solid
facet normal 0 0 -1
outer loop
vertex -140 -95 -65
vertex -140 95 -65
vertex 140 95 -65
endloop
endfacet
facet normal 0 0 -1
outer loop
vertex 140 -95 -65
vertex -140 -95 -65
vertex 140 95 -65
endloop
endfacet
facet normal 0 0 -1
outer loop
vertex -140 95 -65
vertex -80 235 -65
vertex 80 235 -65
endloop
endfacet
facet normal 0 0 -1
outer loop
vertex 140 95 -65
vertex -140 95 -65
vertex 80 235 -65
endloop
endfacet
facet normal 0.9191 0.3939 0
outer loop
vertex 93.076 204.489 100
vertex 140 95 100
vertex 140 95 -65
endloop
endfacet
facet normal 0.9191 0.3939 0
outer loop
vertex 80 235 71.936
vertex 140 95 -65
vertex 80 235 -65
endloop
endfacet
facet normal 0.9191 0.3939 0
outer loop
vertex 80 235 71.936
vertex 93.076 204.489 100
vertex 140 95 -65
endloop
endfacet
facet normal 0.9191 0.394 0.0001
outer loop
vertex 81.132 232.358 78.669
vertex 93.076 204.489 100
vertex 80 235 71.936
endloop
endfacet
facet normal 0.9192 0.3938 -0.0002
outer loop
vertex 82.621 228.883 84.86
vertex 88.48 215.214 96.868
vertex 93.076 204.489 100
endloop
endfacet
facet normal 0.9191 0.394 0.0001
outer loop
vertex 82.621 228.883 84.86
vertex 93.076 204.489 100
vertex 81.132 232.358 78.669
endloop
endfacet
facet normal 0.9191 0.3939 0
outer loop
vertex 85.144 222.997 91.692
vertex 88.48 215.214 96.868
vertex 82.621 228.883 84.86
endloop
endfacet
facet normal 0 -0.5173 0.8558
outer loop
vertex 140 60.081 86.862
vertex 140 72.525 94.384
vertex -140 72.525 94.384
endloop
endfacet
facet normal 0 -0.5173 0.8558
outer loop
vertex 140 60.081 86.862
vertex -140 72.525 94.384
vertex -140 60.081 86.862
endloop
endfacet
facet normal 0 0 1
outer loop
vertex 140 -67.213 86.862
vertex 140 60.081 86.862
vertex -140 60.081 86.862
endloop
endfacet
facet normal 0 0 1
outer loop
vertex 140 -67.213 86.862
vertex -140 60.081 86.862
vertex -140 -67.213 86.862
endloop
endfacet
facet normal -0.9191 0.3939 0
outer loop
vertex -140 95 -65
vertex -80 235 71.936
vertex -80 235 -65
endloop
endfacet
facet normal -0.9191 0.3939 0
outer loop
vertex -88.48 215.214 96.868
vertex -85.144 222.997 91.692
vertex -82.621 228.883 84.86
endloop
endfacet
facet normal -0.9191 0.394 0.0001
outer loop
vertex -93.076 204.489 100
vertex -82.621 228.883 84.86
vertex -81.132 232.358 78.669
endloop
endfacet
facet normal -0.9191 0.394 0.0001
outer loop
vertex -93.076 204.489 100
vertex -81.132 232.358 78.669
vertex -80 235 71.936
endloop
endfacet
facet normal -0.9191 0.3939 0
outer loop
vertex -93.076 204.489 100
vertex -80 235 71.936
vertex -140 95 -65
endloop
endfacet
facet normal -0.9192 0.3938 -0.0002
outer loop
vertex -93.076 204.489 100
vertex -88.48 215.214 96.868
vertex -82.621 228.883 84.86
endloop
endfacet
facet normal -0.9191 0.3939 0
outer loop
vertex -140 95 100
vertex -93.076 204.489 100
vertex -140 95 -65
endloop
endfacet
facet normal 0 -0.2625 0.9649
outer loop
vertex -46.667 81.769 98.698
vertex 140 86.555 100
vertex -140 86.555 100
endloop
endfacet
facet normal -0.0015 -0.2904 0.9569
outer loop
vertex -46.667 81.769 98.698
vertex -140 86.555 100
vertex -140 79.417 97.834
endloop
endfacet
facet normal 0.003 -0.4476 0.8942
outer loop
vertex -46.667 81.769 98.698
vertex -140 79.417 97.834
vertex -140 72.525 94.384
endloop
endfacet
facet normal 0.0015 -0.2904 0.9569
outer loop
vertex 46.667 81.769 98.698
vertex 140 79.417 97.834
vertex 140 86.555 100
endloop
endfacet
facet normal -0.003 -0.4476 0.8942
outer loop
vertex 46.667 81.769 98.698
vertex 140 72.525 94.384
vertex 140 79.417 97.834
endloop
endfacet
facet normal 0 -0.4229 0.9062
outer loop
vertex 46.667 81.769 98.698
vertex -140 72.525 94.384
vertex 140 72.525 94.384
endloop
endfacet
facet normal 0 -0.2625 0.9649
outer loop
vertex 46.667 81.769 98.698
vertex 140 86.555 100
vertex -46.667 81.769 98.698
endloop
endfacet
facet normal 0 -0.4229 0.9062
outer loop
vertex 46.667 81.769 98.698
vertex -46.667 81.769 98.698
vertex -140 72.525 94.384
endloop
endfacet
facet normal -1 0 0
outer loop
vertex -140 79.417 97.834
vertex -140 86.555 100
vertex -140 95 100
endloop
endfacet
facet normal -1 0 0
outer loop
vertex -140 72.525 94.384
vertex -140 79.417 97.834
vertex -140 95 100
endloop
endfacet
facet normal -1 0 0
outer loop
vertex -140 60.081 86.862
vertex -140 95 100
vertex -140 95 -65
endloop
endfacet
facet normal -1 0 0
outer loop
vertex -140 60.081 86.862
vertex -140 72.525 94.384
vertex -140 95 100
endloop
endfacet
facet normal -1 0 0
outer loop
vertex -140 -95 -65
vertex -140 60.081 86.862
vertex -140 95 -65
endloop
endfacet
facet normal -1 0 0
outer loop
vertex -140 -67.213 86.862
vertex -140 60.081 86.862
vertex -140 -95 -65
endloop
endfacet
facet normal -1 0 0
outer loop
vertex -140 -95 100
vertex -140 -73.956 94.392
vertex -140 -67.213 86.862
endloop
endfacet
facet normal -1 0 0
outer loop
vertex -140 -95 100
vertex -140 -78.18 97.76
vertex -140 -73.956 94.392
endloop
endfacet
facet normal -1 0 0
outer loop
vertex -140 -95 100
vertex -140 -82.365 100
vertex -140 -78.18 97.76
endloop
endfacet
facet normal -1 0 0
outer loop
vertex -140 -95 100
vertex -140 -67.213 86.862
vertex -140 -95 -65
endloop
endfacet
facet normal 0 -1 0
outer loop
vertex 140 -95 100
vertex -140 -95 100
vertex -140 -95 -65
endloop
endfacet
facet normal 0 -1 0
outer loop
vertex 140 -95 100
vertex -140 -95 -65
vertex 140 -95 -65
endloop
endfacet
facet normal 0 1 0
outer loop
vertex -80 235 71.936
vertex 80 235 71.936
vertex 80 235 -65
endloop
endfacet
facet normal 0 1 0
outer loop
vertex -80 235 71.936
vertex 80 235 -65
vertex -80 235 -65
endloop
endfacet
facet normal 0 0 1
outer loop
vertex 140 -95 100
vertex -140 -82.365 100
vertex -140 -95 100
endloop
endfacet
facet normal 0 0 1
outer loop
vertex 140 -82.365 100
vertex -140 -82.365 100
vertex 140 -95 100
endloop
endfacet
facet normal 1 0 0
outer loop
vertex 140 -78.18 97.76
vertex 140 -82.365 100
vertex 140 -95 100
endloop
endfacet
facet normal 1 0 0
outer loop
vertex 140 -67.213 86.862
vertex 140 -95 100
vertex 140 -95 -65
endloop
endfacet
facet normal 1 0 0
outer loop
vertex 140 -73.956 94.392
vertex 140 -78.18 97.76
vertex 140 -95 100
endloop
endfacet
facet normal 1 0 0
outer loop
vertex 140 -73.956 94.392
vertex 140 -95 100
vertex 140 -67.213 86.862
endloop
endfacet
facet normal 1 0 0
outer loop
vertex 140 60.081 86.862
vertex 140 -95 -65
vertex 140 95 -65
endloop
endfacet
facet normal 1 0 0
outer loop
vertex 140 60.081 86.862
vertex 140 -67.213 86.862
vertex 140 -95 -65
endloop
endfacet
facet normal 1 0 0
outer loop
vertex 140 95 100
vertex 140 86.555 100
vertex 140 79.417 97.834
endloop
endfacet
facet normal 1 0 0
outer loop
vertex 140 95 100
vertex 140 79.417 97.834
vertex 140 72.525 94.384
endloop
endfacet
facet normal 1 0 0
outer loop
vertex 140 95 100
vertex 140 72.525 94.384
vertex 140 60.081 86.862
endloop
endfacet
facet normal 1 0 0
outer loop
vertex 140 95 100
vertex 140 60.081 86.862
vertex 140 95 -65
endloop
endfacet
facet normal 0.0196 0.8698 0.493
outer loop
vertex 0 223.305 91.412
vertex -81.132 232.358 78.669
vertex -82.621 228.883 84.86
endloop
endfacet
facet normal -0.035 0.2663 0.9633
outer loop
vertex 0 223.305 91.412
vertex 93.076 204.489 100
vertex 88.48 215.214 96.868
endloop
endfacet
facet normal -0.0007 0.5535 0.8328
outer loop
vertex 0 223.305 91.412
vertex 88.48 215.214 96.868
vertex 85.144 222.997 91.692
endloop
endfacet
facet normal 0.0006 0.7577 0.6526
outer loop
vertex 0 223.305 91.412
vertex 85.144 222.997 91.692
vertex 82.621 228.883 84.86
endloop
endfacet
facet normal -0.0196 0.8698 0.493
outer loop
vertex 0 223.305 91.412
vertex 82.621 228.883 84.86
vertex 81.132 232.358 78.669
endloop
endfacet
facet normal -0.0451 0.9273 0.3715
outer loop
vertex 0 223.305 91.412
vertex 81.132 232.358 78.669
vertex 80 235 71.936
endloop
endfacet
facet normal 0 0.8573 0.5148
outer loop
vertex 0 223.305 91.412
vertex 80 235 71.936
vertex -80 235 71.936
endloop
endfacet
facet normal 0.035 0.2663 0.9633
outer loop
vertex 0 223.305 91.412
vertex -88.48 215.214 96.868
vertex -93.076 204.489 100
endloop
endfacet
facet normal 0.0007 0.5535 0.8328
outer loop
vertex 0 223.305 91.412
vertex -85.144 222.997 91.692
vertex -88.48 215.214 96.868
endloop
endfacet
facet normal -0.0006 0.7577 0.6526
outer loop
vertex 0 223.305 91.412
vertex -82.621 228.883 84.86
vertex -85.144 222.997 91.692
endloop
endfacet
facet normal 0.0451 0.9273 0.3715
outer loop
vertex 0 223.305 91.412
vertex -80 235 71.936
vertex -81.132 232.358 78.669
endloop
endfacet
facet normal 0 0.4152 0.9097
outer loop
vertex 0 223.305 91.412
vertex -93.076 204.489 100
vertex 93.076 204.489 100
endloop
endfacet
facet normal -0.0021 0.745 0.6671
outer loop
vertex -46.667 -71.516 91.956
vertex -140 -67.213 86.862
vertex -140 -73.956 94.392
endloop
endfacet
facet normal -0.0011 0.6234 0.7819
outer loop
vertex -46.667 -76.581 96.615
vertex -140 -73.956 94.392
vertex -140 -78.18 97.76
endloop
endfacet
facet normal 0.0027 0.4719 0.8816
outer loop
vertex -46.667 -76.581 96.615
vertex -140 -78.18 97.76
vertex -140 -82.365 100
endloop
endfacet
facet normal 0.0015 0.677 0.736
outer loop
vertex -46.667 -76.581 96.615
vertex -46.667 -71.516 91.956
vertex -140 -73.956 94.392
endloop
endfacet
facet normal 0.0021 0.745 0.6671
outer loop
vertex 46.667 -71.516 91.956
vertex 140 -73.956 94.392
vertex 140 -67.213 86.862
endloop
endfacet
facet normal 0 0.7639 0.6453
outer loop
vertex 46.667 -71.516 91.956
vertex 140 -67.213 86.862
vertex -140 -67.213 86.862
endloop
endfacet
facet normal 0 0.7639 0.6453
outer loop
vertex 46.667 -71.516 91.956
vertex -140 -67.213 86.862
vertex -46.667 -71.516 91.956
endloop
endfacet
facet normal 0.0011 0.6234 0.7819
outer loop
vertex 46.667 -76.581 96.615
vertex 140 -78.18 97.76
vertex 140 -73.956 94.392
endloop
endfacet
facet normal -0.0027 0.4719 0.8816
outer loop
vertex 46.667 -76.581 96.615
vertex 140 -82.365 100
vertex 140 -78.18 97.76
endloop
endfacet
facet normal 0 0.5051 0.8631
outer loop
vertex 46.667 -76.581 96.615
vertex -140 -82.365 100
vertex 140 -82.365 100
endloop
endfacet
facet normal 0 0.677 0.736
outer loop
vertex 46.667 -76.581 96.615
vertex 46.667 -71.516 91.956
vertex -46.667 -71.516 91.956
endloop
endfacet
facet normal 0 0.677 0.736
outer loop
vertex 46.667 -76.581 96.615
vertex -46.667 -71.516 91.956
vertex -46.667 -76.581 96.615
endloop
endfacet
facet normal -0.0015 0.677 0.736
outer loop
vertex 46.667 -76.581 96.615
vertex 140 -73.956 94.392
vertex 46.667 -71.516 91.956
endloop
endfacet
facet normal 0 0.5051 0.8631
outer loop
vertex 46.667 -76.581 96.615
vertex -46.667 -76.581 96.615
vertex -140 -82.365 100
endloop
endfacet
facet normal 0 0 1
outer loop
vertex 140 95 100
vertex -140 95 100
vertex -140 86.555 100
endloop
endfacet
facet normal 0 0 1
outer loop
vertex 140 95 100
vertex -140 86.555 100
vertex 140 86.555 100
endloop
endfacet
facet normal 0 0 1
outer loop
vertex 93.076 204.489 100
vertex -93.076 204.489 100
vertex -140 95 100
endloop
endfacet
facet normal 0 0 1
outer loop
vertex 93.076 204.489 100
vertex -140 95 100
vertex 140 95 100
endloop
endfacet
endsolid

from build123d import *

# Parameters (mm, degrees)
BOSS_EXTRUDE1_DEPTH      = 100
BOSS_EXTRUDE1_DEPTH_BACK = 65
CUT_EXTRUDE1_DEPTH       = 280


with BuildPart() as part:
    # Sketch1 → Boss-Extrude1 (new body, two sides)
    with BuildSketch(Plane.XY) as boss_extrude1_sk:
        Polygon((-140, 95), (-140, -95), (140, -95), (140, 95), (80, 235), (-80, 235), align=None)
    extrude(amount=BOSS_EXTRUDE1_DEPTH)
    extrude(boss_extrude1_sk.sketch, amount=-BOSS_EXTRUDE1_DEPTH_BACK)

    # Sketch2 → Cut-Extrude1 (cut)
    with BuildSketch(Plane(origin=(140, 0, 0), x_dir=(0, 0, -1), z_dir=(1, 0, 0))):
        with BuildLine():
            Line((-100, 190.377151129), (-100, 104.513728645))
            add(Edge.make_bspline(
                [(-100, 104.513728645), (-102.224477009, 93.061564682), (-100.352557358, 82.398786726), (-94.384241048, 72.525394779)],
                knots=[0, 0, 0, 0, 1, 1, 1, 1], degree=3))
            Line((-94.384241048, 72.525394779), (-86.862061889, 60.08144589))
            Line((-86.862061889, 60.08144589), (-86.862061889, -67.213116322))
            add(Edge.make_bspline(
                [(-86.862061889, -67.213116322), (-95.040230762, -73.563203777), (-104.810422505, -83.101213531), (-100, -95)],
                knots=[0, 0, 0, 0, 1, 1, 1, 1], degree=3))
            Line((-100, -95), (-158.360908781, -95))
            Line((-158.360908781, -95), (-158.360908781, 235))
            Line((-158.360908781, 235), (-71.936287457, 235))
            add(Edge.make_bspline(
                [(-71.936287457, 235), (-104.052371602, 224.516044217), (-100, 190.377151129)],
                knots=[0, 0, 0, 1, 1, 1], degree=2))
        make_face()
    extrude(amount=-CUT_EXTRUDE1_DEPTH, mode=Mode.SUBTRACT)


solid = part.part
